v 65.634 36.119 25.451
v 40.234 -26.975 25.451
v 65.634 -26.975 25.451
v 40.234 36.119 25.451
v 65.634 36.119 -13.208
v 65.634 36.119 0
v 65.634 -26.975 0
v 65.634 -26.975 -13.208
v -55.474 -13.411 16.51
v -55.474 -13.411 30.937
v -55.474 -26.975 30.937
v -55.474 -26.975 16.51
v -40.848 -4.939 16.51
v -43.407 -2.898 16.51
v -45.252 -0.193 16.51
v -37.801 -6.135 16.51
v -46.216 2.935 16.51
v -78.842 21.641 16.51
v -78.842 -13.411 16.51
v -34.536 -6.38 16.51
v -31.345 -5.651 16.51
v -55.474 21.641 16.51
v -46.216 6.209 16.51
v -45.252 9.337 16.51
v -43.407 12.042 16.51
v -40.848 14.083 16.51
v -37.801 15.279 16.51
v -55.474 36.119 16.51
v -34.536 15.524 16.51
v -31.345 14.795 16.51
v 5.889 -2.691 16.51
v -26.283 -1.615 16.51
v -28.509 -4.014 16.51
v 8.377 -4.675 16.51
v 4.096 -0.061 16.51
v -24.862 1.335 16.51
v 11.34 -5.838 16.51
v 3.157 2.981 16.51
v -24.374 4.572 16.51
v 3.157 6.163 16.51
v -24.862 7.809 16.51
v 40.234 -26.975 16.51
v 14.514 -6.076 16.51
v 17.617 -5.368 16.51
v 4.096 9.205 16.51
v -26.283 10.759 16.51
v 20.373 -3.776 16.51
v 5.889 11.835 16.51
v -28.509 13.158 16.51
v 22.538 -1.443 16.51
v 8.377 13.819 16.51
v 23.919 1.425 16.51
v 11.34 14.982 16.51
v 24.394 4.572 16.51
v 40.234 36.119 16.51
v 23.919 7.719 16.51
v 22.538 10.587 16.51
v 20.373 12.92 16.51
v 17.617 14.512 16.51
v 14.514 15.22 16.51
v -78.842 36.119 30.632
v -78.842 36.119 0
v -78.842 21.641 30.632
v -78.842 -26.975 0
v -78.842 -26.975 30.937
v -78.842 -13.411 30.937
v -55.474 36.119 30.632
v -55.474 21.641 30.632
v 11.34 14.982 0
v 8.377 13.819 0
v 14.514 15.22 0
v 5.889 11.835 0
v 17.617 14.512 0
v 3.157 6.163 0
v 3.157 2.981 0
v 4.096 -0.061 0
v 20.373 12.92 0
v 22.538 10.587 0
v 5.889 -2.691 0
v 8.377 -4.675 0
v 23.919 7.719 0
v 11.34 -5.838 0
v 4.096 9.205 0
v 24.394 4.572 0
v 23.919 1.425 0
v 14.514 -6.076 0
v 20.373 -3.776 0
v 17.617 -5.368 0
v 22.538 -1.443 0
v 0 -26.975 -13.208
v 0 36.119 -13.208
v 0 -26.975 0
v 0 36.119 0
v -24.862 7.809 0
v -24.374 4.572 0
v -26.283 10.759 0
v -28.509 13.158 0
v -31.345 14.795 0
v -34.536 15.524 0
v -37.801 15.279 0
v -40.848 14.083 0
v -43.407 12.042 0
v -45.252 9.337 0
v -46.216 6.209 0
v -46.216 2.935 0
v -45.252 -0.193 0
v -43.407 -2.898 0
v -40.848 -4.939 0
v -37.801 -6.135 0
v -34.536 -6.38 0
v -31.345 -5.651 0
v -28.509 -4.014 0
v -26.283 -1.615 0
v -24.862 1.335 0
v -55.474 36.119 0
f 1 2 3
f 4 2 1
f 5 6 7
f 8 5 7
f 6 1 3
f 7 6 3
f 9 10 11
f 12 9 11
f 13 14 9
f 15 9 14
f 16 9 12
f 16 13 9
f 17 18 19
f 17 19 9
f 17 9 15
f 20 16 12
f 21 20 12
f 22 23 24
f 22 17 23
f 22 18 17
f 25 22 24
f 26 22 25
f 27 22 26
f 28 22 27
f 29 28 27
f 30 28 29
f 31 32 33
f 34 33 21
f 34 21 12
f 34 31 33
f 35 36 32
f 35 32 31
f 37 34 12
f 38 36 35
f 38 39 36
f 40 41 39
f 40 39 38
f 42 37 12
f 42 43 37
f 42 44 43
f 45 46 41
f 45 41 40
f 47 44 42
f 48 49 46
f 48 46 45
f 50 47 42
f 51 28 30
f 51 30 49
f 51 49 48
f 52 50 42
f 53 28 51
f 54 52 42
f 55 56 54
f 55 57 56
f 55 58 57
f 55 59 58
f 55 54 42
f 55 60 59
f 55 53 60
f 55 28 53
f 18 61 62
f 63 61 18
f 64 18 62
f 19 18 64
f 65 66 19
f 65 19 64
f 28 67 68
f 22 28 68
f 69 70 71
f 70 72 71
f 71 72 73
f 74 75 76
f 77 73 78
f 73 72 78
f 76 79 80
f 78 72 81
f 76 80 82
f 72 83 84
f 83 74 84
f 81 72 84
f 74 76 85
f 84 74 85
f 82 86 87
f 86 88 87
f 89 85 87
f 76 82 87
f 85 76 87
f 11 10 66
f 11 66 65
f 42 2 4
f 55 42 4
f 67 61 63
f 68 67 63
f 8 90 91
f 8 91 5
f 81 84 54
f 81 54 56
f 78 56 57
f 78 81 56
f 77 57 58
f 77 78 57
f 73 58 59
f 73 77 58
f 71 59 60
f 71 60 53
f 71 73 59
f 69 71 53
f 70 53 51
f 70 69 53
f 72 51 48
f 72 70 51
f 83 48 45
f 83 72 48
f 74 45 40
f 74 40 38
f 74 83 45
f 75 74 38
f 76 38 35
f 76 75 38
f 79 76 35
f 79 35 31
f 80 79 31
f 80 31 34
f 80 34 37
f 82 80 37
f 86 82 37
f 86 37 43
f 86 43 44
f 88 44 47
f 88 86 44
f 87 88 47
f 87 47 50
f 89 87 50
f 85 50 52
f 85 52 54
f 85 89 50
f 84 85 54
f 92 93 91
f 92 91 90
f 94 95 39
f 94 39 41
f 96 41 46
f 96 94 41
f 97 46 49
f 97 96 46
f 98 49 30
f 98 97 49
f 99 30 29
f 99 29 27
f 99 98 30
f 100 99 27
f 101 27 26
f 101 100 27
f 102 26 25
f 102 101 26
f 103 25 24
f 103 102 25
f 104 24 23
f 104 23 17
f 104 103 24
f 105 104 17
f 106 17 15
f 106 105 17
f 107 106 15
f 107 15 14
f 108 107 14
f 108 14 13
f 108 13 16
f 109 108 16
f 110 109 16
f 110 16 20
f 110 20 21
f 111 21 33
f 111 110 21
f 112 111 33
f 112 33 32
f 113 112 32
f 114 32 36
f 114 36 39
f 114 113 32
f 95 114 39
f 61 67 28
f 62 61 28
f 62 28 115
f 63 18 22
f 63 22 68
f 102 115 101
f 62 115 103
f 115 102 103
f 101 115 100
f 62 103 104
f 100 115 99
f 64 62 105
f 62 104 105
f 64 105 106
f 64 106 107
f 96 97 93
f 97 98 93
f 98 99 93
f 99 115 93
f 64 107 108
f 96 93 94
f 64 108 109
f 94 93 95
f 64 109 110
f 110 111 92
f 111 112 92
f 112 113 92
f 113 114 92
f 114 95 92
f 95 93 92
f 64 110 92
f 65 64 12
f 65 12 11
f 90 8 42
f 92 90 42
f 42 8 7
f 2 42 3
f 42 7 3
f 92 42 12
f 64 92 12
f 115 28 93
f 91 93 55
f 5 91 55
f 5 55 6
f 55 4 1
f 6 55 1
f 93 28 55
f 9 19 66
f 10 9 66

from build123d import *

# Parameters (mm, degrees)
F0_W     = 95.7072004676
F0_H     = 63.0935970694
F0_R     = 10.9823224345
F0_R_2   = 10.6777928839
F1_DEPTH = 16.51
F2_W     = 63.0935970694
F2_H     = 25.4507996142
F3_DEPTH = 25.4
F4_W     = 65.6336008847
F4_H     = 63.0935970694
F5_DEPTH = 13.208
F6_W     = 14.4779980183
F6_H     = 14.1224008852
F6_W_2   = 13.5636003688
F6_H_2   = 14.4272004122
F7_DEPTH = 23.368


with BuildPart() as f1:
    # F0 (on Top) → F1 (new body)
    with BuildSketch(Plane.XY):
        with Locations((-7.6199993491, 4.5719994232)):
            Rectangle(F0_W, F0_H)
        with Locations((-35.3568010032, 4.5719994232)):
            Circle(F0_R, mode=Mode.SUBTRACT)
        with Locations((13.7159992009, 4.5719994232)):
            Circle(F0_R_2, mode=Mode.SUBTRACT)
    extrude(amount=F1_DEPTH)

    # F2 (on face) → F3 (join)
    with BuildSketch(Plane.YZ.offset(40.2336008847)):
        with Locations((4.5719994232, 12.7253998071)):
            Rectangle(F2_W, F2_H)
    extrude(amount=F3_DEPTH)

    # F4 (on face) → F5 (join)
    with BuildSketch(Plane(origin=(0, 0, 0), x_dir=(1, 0, 0), z_dir=(0, 0, -1))):
        with Locations((32.8168004423, -4.5719994232)):
            Rectangle(F4_W, F4_H)
    extrude(amount=F5_DEPTH)

    # F6 (on face) → F7 (join)
    with BuildSketch(Plane(origin=(-55.4735995829, 0, 0), x_dir=(0, -1, 0), z_dir=(-1, 0, 0))):
        with Locations((-28.8797989488, 23.5712004426)):
            Rectangle(F6_W, F6_H)
        Polygon((-21.6407999396, 16.51), (-36.1187979579, 16.51), (-36.1187979579, 0), (26.9747991115, 0), (26.9747991115, 16.51), (13.4111987427, 16.51), align=None)
        with Locations((20.1929989271, 23.7236002061)):
            Rectangle(F6_W_2, F6_H_2)
    extrude(amount=F7_DEPTH)


solid = f1.part
